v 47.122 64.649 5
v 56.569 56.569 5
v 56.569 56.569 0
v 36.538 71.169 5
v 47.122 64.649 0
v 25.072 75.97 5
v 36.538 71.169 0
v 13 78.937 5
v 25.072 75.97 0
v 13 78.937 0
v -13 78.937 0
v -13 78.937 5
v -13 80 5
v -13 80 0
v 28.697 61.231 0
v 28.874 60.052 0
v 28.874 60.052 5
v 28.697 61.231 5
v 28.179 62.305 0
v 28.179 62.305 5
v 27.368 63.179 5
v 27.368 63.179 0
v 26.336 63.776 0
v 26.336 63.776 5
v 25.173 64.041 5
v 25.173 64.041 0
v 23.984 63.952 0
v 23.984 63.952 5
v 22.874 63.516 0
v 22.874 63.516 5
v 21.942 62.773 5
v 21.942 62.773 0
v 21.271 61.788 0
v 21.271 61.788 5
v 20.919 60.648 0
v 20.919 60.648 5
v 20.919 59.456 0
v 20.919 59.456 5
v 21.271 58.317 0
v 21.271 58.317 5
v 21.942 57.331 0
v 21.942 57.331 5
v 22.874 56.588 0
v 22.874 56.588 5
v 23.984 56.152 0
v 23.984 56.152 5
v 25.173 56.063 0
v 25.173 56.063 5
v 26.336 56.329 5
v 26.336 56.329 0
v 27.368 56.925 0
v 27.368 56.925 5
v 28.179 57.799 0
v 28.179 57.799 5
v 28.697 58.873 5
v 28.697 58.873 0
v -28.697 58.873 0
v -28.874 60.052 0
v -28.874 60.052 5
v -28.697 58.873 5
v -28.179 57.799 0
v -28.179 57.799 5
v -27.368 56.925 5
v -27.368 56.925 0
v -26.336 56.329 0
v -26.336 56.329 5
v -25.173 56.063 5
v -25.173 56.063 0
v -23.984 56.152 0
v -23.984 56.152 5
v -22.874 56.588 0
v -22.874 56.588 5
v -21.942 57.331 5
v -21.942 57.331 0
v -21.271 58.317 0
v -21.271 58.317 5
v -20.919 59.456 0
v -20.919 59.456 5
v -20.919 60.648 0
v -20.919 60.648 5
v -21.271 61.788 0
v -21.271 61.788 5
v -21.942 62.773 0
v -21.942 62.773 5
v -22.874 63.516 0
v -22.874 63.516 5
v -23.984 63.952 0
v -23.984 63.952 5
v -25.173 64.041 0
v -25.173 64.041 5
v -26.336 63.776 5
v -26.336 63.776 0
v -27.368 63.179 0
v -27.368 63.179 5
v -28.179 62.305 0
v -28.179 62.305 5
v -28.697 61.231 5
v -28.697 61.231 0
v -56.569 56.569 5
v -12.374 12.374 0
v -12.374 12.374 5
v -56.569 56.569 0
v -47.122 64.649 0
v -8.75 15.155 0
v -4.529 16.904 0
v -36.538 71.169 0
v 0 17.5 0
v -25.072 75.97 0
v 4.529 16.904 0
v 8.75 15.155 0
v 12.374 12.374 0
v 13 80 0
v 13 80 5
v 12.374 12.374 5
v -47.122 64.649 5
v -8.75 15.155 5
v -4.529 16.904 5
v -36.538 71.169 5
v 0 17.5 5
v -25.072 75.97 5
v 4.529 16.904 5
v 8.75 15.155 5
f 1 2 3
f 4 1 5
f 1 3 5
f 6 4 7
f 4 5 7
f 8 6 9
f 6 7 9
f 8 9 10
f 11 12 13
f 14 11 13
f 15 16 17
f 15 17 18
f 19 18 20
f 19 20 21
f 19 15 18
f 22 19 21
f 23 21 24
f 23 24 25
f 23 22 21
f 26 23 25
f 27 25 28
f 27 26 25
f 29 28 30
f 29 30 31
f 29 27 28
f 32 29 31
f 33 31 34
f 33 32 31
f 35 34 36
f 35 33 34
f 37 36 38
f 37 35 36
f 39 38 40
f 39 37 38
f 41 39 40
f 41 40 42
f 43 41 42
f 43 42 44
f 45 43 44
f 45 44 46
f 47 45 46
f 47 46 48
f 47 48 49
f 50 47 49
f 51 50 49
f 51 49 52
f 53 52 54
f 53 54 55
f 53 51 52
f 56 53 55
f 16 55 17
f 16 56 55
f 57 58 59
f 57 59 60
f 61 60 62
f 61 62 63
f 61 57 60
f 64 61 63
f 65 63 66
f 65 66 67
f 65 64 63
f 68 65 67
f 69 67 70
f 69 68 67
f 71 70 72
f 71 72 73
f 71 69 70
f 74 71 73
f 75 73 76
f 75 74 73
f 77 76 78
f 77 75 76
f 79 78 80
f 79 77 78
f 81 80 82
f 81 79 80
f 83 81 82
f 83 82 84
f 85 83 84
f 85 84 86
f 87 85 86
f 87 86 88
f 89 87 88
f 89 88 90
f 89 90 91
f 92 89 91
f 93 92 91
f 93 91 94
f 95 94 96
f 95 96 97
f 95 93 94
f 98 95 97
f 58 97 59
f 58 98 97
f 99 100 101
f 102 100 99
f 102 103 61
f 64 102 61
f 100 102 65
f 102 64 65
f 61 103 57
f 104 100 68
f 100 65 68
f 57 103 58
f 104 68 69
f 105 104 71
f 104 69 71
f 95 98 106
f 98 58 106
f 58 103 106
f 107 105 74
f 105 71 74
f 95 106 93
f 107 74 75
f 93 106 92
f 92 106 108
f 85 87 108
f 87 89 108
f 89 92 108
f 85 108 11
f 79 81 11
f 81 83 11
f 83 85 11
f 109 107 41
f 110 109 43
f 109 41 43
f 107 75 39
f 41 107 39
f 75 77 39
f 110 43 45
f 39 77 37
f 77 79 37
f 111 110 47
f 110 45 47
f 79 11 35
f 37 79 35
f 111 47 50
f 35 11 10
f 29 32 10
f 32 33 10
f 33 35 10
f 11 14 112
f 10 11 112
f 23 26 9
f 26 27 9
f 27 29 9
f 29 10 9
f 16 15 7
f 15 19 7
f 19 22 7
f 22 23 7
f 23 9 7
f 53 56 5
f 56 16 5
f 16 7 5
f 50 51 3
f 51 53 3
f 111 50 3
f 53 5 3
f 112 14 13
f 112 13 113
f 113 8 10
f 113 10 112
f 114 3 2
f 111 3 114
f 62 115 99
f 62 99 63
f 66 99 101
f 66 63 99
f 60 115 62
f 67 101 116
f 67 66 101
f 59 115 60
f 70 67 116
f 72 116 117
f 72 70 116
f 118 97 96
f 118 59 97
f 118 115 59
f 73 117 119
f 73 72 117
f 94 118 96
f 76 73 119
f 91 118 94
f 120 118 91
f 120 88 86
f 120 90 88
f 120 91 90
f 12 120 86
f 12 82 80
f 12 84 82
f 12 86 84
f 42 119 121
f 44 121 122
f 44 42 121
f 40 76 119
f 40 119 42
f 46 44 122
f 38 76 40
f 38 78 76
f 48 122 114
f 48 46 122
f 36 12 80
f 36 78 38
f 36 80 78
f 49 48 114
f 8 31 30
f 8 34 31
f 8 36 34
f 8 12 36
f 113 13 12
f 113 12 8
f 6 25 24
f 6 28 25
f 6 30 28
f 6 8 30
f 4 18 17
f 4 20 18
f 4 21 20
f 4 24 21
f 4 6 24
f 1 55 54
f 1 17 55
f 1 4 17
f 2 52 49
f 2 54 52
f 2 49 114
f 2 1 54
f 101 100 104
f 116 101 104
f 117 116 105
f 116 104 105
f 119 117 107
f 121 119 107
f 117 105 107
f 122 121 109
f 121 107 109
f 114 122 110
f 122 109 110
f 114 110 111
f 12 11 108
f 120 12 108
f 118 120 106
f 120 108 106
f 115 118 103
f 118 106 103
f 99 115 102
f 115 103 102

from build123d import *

# Parameters (mm, degrees)
SKETCH1_R           = 4
BOSS_EXTRUDE1_DEPTH = 5
CUT_EXTRUDE1_DEPTH  = 114.247516529
SKETCH3_W           = 26
SKETCH3_H           = 1.063316513
BOSS_EXTRUDE2_DEPTH = 5


with BuildPart() as part:
    # Sketch1 → Boss-Extrude1 (new body)
    with BuildSketch(Plane.XY):
        with BuildLine():
            Line((-80, 0), (-17.5, 0))
            ThreePointArc((-17.5, 0), (0, 17.5), (17.5, 0))
            Line((17.5, 0), (80, 0))
            ThreePointArc((80, 0), (0, 80), (-80, 0))
        make_face()
        with Locations((24.874423104, 60.052169613)):
            Circle(SKETCH1_R, mode=Mode.SUBTRACT)
        with Locations((60.052169613, 24.874423104)):
            Circle(SKETCH1_R, mode=Mode.SUBTRACT)
        with Locations((-60.052169613, 24.874423104)):
            Circle(SKETCH1_R, mode=Mode.SUBTRACT)
        with Locations(Location((-24.874423104, 60.052169613, 0), (0, 0, 180))):
            Circle(SKETCH1_R, mode=Mode.SUBTRACT)
    extrude(amount=BOSS_EXTRUDE1_DEPTH)

    # Sketch2 → Cut-Extrude1 (cut, through all)
    with BuildSketch(Plane.XY):
        with BuildLine():
            Line((-12.374368671, 12.374368671), (-56.568542495, 56.568542495))
            Line((-56.568542495, 56.568542495), (-80, 56.568542495))
            Line((-80, 56.568542495), (-80, 0))
            Line((-80, 0), (-17.5, 0))
            ThreePointArc((-17.5, 0), (-16.167891819, 6.696960066), (-12.374368671, 12.374368671))
        make_face()
        with BuildLine():
            Line((80, 0), (80, 56.568542495))
            Line((80, 56.568542495), (56.568542495, 56.568542495))
            Line((56.568542495, 56.568542495), (12.374368671, 12.374368671))
            ThreePointArc((12.374368671, 12.374368671), (16.167891819, 6.696960066), (17.5, 0))
            Line((17.5, 0), (80, 0))
        make_face()
    extrude(amount=CUT_EXTRUDE1_DEPTH, mode=Mode.SUBTRACT)

    # Sketch3 → Boss-Extrude2 (add)
    with BuildSketch(Plane.XY):
        with Locations((0, 79.468341744)):
            Rectangle(SKETCH3_W, SKETCH3_H)
    extrude(amount=BOSS_EXTRUDE2_DEPTH)


solid = part.part
